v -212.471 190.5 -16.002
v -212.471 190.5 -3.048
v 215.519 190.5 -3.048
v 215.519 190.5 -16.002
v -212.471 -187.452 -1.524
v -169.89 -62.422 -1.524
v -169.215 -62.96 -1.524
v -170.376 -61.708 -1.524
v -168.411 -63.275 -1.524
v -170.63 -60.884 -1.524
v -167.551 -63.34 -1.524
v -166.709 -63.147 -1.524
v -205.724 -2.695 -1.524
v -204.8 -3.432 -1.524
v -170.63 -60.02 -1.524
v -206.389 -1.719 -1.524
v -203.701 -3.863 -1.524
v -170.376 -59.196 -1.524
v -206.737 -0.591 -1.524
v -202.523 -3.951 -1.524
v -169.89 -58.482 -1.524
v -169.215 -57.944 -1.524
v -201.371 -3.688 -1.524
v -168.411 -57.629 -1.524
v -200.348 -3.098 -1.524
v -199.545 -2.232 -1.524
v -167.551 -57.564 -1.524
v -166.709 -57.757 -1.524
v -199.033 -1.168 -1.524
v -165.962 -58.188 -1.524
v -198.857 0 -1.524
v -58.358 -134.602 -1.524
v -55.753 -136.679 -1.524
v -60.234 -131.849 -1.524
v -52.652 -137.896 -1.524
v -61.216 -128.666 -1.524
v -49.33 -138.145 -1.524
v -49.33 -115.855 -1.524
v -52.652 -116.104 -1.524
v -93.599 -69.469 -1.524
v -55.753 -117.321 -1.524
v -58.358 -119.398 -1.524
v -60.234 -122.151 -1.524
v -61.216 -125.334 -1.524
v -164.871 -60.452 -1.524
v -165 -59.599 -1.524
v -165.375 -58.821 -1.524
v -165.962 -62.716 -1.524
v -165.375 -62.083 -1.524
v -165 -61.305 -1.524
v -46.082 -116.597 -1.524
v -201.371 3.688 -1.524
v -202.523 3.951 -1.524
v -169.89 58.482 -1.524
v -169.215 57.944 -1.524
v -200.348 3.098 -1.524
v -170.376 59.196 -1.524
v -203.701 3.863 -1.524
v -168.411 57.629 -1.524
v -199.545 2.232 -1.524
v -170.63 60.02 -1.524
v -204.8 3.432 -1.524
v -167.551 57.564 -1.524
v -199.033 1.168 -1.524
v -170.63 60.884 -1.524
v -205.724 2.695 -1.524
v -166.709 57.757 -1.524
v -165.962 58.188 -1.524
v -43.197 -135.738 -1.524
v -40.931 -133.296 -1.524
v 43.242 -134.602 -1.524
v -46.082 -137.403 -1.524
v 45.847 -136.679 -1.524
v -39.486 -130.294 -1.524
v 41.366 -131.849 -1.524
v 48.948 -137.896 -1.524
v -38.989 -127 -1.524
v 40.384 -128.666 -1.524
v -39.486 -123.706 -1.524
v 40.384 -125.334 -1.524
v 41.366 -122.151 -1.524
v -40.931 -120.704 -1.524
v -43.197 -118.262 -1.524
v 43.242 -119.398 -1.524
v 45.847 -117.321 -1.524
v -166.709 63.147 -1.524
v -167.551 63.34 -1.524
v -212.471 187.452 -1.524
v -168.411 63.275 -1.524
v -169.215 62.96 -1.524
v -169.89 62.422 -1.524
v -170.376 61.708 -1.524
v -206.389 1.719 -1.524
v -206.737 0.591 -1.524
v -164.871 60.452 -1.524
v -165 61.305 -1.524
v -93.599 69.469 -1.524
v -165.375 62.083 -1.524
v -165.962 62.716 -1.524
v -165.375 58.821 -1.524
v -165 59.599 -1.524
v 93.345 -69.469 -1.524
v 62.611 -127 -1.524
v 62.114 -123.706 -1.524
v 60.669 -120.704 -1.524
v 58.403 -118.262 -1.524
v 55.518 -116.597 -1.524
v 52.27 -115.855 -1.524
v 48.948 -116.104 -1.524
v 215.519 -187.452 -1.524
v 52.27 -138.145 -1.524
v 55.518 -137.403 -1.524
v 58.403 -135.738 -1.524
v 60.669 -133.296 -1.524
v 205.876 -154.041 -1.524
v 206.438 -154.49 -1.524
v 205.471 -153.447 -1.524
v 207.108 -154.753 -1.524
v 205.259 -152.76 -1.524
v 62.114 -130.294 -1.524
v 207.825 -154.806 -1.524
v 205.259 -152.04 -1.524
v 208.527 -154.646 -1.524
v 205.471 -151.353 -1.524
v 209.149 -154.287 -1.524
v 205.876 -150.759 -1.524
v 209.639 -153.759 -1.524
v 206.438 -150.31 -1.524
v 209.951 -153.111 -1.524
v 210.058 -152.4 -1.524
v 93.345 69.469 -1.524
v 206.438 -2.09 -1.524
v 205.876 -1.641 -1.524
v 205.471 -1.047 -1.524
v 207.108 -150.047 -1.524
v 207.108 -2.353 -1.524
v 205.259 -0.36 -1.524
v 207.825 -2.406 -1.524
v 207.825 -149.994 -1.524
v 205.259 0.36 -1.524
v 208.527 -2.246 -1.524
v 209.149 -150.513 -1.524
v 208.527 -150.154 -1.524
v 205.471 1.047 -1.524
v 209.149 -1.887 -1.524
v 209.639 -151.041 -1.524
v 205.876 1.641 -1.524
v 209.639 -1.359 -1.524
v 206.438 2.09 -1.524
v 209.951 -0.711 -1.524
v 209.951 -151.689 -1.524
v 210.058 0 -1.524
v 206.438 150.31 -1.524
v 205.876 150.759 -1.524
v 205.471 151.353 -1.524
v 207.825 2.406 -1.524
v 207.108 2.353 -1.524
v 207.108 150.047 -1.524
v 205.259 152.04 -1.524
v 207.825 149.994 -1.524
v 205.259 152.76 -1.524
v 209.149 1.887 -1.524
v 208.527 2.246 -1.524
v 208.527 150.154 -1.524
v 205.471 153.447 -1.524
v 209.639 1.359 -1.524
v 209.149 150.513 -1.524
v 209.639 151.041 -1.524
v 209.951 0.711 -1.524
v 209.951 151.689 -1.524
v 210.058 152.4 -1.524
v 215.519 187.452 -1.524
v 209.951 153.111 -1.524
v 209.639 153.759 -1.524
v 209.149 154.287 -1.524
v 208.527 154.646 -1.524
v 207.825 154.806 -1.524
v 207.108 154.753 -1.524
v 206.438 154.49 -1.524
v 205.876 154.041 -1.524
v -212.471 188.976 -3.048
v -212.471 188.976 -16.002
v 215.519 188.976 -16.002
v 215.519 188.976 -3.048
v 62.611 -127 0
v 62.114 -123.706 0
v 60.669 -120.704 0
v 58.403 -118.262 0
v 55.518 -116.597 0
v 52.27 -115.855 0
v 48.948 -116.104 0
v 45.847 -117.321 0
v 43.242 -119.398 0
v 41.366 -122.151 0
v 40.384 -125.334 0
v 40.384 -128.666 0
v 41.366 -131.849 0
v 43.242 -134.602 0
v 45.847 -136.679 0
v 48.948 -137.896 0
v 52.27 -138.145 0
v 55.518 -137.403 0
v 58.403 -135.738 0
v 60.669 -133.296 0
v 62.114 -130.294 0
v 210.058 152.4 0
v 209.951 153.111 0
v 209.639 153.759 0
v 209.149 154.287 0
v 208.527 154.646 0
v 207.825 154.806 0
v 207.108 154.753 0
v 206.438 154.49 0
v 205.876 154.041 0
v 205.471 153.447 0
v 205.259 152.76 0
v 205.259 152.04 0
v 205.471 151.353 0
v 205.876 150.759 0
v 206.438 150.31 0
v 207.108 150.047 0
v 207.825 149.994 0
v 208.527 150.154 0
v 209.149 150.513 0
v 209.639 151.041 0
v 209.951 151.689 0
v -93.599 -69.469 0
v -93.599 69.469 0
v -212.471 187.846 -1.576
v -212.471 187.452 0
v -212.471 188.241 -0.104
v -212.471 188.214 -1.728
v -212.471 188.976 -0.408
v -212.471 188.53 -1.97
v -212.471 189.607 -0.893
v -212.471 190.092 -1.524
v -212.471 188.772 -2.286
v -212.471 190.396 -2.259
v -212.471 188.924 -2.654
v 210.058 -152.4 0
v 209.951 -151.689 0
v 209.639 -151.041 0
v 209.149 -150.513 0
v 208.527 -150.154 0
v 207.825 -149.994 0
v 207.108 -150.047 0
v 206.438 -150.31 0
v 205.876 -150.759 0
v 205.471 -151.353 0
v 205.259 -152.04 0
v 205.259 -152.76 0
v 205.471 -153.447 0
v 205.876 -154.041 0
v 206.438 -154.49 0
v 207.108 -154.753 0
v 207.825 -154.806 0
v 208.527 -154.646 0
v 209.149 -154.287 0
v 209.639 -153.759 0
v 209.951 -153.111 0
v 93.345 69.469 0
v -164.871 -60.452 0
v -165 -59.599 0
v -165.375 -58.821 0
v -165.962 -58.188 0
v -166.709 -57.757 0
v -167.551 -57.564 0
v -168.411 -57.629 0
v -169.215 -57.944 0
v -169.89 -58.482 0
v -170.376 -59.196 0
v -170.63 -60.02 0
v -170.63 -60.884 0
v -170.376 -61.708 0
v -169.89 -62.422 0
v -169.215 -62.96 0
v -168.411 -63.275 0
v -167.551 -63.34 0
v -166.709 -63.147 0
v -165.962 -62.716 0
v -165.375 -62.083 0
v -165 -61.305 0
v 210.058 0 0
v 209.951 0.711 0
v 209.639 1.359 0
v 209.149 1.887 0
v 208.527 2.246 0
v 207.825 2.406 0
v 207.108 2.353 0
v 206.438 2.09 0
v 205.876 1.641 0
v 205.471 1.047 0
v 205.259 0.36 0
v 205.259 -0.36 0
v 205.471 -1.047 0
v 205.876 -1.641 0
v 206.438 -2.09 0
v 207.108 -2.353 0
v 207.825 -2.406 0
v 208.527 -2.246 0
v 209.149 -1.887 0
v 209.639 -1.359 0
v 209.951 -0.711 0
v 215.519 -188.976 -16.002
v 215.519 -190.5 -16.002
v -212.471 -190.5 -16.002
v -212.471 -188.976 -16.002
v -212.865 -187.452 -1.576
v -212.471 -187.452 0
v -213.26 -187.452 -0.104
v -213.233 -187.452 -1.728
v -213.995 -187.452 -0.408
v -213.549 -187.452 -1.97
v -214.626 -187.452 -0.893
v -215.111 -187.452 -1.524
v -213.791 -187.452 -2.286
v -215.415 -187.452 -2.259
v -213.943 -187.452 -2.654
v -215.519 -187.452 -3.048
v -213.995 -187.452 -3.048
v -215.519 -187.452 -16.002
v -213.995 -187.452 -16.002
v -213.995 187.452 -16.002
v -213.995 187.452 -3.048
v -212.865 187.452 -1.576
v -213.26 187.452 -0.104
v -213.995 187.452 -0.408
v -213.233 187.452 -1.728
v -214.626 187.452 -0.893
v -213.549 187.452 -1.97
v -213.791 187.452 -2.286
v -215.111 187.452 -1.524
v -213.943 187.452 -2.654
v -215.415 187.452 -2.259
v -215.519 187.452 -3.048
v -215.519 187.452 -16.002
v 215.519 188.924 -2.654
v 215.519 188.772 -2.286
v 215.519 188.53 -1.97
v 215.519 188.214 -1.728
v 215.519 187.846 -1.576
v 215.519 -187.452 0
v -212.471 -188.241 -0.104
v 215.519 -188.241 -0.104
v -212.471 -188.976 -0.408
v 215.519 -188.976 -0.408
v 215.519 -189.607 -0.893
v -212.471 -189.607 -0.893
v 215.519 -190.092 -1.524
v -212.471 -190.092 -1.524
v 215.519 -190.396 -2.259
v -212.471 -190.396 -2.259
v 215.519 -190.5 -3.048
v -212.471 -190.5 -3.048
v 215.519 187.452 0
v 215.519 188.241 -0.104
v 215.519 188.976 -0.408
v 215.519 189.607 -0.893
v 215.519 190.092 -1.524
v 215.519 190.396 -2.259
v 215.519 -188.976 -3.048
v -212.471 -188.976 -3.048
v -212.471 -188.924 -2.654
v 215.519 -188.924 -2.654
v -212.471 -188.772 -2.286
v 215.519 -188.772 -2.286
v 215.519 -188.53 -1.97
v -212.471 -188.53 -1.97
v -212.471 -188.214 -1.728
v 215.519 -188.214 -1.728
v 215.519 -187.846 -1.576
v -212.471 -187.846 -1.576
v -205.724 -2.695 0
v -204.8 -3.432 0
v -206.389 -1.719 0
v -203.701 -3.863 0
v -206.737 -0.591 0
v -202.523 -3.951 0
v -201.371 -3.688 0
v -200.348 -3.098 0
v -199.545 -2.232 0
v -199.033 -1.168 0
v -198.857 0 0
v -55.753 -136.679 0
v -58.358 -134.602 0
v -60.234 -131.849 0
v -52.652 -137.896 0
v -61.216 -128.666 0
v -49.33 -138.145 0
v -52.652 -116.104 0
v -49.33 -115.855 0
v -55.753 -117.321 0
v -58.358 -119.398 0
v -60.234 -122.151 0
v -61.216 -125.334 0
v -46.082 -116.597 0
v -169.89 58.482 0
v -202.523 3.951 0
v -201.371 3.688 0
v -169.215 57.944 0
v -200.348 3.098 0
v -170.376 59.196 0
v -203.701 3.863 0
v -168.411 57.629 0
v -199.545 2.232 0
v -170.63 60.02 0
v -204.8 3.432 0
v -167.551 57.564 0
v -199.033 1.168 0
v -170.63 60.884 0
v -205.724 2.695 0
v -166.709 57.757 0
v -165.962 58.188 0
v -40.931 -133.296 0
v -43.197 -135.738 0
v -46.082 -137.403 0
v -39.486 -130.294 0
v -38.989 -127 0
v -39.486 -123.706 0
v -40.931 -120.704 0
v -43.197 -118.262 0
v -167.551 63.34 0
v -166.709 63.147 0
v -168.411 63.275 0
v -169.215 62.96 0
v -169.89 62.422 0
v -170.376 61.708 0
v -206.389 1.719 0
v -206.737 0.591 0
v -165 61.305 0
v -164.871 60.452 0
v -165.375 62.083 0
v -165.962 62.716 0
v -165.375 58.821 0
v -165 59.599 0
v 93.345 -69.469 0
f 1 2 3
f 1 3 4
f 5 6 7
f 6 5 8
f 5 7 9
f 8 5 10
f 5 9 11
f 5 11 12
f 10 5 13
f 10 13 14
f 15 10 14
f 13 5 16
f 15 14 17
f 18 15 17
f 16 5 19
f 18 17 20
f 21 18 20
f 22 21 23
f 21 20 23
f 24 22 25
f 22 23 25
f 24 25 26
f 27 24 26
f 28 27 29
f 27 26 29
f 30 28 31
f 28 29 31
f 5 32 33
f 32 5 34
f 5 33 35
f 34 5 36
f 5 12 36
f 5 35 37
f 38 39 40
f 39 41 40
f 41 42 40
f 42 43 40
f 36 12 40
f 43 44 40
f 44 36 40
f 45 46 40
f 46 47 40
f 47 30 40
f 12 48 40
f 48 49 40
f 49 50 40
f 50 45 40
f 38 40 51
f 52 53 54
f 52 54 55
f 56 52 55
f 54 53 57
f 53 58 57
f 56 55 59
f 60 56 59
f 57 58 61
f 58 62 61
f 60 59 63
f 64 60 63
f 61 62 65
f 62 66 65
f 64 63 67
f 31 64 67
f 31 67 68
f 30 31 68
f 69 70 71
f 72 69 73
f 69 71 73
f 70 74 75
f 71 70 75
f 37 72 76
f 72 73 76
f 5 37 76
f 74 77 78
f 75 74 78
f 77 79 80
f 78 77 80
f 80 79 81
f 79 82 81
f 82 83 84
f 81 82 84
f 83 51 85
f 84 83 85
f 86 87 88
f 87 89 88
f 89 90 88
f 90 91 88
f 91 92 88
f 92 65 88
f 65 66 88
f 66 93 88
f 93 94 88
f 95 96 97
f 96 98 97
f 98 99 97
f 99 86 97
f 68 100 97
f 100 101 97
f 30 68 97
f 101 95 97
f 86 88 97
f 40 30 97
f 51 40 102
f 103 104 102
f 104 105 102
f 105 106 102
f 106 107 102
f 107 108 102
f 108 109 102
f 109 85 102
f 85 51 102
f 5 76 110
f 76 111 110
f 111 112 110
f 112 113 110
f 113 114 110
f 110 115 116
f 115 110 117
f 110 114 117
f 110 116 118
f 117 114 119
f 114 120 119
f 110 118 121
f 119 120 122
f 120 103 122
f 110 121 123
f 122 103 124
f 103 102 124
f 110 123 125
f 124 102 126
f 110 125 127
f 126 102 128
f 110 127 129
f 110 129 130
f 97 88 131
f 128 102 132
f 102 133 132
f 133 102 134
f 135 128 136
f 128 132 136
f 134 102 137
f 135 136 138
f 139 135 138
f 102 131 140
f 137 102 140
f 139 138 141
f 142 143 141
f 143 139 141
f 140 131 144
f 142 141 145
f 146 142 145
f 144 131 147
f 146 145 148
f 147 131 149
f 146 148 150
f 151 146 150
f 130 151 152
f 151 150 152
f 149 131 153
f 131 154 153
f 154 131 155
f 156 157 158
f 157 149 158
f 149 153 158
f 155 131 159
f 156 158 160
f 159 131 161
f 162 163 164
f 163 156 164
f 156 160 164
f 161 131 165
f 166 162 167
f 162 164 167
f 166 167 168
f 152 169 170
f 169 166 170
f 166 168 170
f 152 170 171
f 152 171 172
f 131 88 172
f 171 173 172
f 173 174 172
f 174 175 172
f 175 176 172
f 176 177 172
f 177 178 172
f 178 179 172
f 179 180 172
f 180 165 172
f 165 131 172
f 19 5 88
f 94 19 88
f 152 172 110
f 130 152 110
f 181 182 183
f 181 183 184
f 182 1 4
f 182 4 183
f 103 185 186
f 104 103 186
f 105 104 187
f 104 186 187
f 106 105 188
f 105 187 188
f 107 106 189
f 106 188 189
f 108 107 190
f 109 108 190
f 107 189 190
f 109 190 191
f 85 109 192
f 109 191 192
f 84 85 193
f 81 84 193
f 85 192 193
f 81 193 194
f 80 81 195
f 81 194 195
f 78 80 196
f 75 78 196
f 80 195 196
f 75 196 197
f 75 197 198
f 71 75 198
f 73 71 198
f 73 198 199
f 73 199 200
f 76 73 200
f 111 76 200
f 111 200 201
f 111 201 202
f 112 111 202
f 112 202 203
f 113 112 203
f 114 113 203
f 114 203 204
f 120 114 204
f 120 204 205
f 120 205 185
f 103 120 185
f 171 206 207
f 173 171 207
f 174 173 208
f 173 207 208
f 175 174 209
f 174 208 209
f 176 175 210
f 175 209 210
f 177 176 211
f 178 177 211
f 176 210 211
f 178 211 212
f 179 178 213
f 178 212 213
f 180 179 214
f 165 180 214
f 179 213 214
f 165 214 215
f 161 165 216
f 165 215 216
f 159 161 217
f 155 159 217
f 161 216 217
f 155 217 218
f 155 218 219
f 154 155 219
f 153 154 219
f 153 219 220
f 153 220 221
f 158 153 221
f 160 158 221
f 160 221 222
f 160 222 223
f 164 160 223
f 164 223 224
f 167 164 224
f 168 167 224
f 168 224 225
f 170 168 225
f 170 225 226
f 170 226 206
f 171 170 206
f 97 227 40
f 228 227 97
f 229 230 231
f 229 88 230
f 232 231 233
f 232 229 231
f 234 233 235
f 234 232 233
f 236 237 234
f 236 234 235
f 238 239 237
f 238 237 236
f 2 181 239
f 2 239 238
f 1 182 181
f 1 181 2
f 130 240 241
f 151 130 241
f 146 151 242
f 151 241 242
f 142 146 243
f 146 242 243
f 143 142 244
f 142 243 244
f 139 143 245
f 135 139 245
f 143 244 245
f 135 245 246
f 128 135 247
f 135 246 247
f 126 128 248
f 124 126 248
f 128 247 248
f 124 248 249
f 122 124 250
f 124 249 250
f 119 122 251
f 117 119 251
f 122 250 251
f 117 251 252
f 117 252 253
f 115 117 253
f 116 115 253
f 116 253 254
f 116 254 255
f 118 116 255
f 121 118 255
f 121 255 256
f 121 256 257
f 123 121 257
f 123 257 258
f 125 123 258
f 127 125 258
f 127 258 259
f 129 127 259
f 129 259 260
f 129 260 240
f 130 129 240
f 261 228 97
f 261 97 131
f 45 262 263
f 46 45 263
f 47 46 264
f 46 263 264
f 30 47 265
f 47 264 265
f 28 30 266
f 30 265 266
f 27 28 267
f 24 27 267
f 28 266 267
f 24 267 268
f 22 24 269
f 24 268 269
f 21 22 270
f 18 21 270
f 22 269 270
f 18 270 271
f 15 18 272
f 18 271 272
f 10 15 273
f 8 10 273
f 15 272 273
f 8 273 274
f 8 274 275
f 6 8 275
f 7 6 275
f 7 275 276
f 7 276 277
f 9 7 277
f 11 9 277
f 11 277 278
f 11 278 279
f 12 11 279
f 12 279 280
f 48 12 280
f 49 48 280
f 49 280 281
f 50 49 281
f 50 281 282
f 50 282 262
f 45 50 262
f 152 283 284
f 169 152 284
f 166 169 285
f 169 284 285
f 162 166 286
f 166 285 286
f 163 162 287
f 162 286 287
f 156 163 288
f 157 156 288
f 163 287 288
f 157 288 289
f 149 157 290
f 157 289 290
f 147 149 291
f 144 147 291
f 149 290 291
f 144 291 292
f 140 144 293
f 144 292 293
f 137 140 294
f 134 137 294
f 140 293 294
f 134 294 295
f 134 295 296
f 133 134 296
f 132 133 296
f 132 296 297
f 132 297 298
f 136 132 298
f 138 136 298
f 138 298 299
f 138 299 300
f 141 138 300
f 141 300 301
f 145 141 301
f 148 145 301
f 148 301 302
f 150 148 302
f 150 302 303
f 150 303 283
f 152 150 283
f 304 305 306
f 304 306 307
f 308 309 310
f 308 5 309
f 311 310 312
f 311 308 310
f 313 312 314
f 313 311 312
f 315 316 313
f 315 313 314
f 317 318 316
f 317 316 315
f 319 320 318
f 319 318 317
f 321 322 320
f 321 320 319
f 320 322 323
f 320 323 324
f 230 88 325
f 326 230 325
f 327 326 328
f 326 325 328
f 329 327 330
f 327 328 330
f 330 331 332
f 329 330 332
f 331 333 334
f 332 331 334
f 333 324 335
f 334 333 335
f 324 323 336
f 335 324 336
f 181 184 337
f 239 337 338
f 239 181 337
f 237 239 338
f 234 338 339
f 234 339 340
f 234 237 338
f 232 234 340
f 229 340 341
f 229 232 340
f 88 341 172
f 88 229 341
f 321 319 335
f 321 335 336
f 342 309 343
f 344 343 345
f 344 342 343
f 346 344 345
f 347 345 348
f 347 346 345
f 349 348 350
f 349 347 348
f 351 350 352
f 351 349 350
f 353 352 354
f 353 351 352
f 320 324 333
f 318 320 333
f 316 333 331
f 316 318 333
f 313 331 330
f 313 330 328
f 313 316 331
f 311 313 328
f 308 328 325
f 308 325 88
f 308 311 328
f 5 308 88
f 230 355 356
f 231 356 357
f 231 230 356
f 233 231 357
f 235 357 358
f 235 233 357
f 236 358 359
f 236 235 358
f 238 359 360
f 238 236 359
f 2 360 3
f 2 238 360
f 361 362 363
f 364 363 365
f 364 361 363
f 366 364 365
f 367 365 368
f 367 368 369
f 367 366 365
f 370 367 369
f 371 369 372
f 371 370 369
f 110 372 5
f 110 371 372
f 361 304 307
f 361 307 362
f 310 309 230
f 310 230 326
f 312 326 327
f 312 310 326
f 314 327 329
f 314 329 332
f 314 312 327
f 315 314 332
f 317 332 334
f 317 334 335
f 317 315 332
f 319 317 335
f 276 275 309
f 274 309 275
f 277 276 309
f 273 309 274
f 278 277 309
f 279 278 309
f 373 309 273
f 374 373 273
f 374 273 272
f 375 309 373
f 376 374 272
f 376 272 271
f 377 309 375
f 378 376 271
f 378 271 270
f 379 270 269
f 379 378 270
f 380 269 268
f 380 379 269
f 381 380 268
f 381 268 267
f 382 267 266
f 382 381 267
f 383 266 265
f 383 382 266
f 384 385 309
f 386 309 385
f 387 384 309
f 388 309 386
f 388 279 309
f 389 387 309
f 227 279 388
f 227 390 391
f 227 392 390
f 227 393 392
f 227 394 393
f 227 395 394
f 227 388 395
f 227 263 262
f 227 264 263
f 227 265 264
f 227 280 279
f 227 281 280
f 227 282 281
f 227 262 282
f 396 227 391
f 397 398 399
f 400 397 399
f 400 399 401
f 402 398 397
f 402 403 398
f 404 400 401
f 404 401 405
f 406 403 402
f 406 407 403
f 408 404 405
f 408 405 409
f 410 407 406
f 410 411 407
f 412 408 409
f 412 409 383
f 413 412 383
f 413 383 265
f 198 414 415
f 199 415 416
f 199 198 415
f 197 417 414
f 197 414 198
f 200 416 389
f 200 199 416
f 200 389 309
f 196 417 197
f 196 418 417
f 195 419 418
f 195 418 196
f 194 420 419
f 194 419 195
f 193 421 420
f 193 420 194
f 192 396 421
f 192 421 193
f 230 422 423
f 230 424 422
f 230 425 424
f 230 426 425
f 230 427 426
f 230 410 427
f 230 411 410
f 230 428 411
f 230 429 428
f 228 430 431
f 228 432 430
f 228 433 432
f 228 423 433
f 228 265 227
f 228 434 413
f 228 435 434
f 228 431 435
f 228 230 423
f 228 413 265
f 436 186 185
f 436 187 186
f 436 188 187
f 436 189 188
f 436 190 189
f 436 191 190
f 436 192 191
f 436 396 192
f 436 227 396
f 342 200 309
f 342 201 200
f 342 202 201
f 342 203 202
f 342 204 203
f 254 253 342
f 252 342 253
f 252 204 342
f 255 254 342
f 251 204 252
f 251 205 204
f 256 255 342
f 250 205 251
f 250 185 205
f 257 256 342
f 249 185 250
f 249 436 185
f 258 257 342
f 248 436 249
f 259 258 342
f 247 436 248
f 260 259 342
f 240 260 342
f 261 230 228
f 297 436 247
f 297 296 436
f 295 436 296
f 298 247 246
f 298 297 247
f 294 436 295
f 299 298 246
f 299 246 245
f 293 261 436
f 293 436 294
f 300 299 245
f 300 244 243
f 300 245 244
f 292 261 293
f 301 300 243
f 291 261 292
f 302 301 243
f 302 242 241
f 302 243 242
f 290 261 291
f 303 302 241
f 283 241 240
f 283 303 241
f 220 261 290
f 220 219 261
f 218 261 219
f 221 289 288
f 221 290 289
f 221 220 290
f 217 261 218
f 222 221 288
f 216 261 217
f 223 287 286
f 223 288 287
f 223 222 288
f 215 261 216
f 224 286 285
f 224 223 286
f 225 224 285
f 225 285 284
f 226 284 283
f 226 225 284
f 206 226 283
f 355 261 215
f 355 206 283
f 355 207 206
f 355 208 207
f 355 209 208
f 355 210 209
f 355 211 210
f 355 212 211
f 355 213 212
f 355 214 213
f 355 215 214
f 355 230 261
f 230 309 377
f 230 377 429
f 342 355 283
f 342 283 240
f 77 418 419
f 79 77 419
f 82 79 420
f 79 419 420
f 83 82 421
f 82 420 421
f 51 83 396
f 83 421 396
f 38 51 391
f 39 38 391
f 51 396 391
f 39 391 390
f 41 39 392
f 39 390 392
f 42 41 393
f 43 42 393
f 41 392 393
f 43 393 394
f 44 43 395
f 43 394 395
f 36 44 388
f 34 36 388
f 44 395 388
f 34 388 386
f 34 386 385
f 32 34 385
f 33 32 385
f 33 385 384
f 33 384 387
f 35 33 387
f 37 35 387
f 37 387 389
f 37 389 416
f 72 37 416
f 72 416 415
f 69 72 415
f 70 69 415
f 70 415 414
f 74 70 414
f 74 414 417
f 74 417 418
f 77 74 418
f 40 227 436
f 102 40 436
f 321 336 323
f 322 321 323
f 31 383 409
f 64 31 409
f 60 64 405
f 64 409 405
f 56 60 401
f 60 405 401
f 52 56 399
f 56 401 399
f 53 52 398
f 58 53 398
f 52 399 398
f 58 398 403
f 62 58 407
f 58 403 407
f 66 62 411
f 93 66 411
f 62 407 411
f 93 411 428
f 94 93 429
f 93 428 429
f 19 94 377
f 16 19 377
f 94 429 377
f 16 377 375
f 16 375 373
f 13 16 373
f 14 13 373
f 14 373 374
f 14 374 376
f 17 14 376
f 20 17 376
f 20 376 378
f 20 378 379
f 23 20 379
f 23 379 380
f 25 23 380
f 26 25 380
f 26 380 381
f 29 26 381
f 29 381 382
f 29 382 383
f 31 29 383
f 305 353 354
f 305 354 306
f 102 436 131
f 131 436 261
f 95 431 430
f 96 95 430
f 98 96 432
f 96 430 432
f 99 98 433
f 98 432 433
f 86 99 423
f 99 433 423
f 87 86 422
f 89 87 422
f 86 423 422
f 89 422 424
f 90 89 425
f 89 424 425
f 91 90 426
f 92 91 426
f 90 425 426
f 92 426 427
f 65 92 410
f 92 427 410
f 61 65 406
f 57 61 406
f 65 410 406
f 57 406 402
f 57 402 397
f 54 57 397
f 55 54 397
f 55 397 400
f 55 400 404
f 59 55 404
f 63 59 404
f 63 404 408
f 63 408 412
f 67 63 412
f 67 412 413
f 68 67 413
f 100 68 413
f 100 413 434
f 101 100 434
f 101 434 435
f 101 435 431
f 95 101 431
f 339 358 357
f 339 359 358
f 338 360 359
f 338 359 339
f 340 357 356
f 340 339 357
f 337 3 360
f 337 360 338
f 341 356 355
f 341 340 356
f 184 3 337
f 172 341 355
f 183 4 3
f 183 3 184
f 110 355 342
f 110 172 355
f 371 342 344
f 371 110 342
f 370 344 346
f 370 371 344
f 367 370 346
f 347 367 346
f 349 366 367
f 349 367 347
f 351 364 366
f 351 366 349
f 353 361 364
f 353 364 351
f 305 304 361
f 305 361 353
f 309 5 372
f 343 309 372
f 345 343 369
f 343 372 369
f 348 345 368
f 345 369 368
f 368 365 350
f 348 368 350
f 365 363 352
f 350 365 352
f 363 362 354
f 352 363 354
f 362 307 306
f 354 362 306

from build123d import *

# Parameters (mm, degrees)
CROQUIS1_W                         = 431.038
CROQUIS1_H                         = 381
BRIDA_BASE1_DEPTH                  = 1.524
CROQUIS6_W                         = 3.048
CROQUIS6_H                         = 3.048
CORTAR_EXTRUIR1_DEPTH              = 288.647374292
BRIDA_DE_ARISTA1_STRIP_W           = 9.144
BRIDA_DE_ARISTA1_STRIP_H           = 1.524
BRIDA_DE_ARISTA1_STRIP_CUT_DEPTH   = 427.99
BRIDA_DE_ARISTA1_STRIP_2_W         = 9.144
BRIDA_DE_ARISTA1_STRIP_2_H         = 1.524
BRIDA_DE_ARISTA1_STRIP_CUT_2_DEPTH = 374.904
BRIDA_DE_ARISTA1_STRIP_3_W         = 9.144
BRIDA_DE_ARISTA1_STRIP_3_H         = 1.524
BRIDA_DE_ARISTA1_STRIP_CUT_3_DEPTH = 427.99
BRIDA_DE_ARISTA1_DEPTH             = 427.99
BRIDA_DE_ARISTA1_BEND_DEPTH        = 374.904
BRIDA_DE_ARISTA1_BEND_2_DEPTH      = 427.99
CROQUIS16_R                        = 3.9624
CROQUIS16_R_2                      = 2.8956
CROQUIS16_R_3                      = 11.176
CROQUIS16_R_4                      = 2.413
CROQUIS16_W                        = 186.944
CROQUIS16_H                        = 138.938
CORTAR_EXTRUIR2_DEPTH              = 289.088100006


# Sheet-metal steps are written as plain solids
with BuildPart() as part:
    # Croquis1 → Brida base1 (new body)
    with BuildSketch(Plane.XY):
        Rectangle(CROQUIS1_W, CROQUIS1_H)
    extrude(amount=-BRIDA_BASE1_DEPTH)

    # Croquis6 → Cortar-Extruir1 (cut, through all)
    with BuildSketch(Plane.XY):
        with Locations((-213.995, 188.976)):
            Rectangle(CROQUIS6_W, CROQUIS6_H)
        with Locations((-213.995, -188.976)):
            Rectangle(CROQUIS6_W, CROQUIS6_H)
    extrude(amount=-CORTAR_EXTRUIR1_DEPTH, mode=Mode.SUBTRACT)

    # Brida de arista1 strip (across the edge) → Brida de arista1 strip cut (cut)
    with BuildSketch(Plane(origin=(-212.471, 190.5, -1.524), x_dir=(0, -1, 0), z_dir=(1, 0, 0))):
        with Locations((-1.524, -0.762)):
            Rectangle(BRIDA_DE_ARISTA1_STRIP_W, BRIDA_DE_ARISTA1_STRIP_H)
    extrude(amount=BRIDA_DE_ARISTA1_STRIP_CUT_DEPTH, mode=Mode.SUBTRACT)

    # Brida de arista1 strip 2 (across the edge) → Brida de arista1 strip cut 2 (cut)
    with BuildSketch(Plane(origin=(-215.519, -187.452, -1.524), x_dir=(1, 0, 0), z_dir=(0, 1, 0))):
        with Locations((-1.524, -0.762)):
            Rectangle(BRIDA_DE_ARISTA1_STRIP_2_W, BRIDA_DE_ARISTA1_STRIP_2_H)
    extrude(amount=BRIDA_DE_ARISTA1_STRIP_CUT_2_DEPTH, mode=Mode.SUBTRACT)

    # Brida de arista1 strip 3 (across the edge) → Brida de arista1 strip cut 3 (cut)
    with BuildSketch(Plane(origin=(215.519, -190.5, -1.524), x_dir=(0, 1, 0), z_dir=(-1, 0, 0))):
        with Locations((-1.524, -0.762)):
            Rectangle(BRIDA_DE_ARISTA1_STRIP_3_W, BRIDA_DE_ARISTA1_STRIP_3_H)
    extrude(amount=BRIDA_DE_ARISTA1_STRIP_CUT_3_DEPTH, mode=Mode.SUBTRACT)

    # Brida de arista1 section (across the edge) → Brida de arista1 (add)
    with BuildSketch(Plane(origin=(-212.471, 190.5, -1.524), x_dir=(0, -1, 0), z_dir=(1, 0, 0))):
        with BuildLine():
            Line((0, 1.524), (0, 14.478))
            Line((0, 14.478), (1.524, 14.478))
            Line((1.524, 14.478), (1.524, 1.524))
            ThreePointArc((1.524, 1.524), (1.970369265, 0.446369265), (3.048, 0))
            Line((3.048, 0), (3.048, -1.524))
            ThreePointArc((3.048, -1.524), (0.892738531, -0.631261469), (0, 1.524))
        make_face()
    extrude(amount=BRIDA_DE_ARISTA1_DEPTH)

    # Brida de arista1 section 2 (across the edge) → Brida de arista1 bend (add)
    with BuildSketch(Plane(origin=(-215.519, -187.452, -1.524), x_dir=(1, 0, 0), z_dir=(0, 1, 0))):
        with BuildLine():
            Line((0, 1.524), (0, 14.478))
            Line((0, 14.478), (1.524, 14.478))
            Line((1.524, 14.478), (1.524, 1.524))
            ThreePointArc((1.524, 1.524), (1.970369265, 0.446369265), (3.048, 0))
            Line((3.048, 0), (3.048, -1.524))
            ThreePointArc((3.048, -1.524), (0.892738531, -0.631261469), (0, 1.524))
        make_face()
    extrude(amount=BRIDA_DE_ARISTA1_BEND_DEPTH)

    # Brida de arista1 section 3 (across the edge) → Brida de arista1 bend 2 (add)
    with BuildSketch(Plane(origin=(215.519, -190.5, -1.524), x_dir=(0, 1, 0), z_dir=(-1, 0, 0))):
        with BuildLine():
            Line((0, 1.524), (0, 14.478))
            Line((0, 14.478), (1.524, 14.478))
            Line((1.524, 14.478), (1.524, 1.524))
            ThreePointArc((1.524, 1.524), (1.970369265, 0.446369265), (3.048, 0))
            Line((3.048, 0), (3.048, -1.524))
            ThreePointArc((3.048, -1.524), (0.892738531, -0.631261469), (0, 1.524))
        make_face()
    extrude(amount=BRIDA_DE_ARISTA1_BEND_2_DEPTH)

    # Croquis16 → Cortar-Extruir2 (cut, through all)
    with BuildSketch(Plane.XY):
        with Locations((-202.819, 0)):
            Circle(CROQUIS16_R)
        with Locations((-167.767, 60.452)):
            Circle(CROQUIS16_R_2)
        with Locations((-167.767, -60.452)):
            Circle(CROQUIS16_R_2)
        with Locations((-50.165, -127)):
            Circle(CROQUIS16_R_3)
        with Locations((51.435, -127)):
            Circle(CROQUIS16_R_3)
        with Locations((207.645, 152.4)):
            Circle(CROQUIS16_R_4)
        with Locations((207.645, 0)):
            Circle(CROQUIS16_R_4)
        with Locations((207.645, -152.4)):
            Circle(CROQUIS16_R_4)
        with Locations((-0.127, 0)):
            Rectangle(CROQUIS16_W, CROQUIS16_H)
    extrude(amount=-CORTAR_EXTRUIR2_DEPTH, mode=Mode.SUBTRACT)


solid = part.part
